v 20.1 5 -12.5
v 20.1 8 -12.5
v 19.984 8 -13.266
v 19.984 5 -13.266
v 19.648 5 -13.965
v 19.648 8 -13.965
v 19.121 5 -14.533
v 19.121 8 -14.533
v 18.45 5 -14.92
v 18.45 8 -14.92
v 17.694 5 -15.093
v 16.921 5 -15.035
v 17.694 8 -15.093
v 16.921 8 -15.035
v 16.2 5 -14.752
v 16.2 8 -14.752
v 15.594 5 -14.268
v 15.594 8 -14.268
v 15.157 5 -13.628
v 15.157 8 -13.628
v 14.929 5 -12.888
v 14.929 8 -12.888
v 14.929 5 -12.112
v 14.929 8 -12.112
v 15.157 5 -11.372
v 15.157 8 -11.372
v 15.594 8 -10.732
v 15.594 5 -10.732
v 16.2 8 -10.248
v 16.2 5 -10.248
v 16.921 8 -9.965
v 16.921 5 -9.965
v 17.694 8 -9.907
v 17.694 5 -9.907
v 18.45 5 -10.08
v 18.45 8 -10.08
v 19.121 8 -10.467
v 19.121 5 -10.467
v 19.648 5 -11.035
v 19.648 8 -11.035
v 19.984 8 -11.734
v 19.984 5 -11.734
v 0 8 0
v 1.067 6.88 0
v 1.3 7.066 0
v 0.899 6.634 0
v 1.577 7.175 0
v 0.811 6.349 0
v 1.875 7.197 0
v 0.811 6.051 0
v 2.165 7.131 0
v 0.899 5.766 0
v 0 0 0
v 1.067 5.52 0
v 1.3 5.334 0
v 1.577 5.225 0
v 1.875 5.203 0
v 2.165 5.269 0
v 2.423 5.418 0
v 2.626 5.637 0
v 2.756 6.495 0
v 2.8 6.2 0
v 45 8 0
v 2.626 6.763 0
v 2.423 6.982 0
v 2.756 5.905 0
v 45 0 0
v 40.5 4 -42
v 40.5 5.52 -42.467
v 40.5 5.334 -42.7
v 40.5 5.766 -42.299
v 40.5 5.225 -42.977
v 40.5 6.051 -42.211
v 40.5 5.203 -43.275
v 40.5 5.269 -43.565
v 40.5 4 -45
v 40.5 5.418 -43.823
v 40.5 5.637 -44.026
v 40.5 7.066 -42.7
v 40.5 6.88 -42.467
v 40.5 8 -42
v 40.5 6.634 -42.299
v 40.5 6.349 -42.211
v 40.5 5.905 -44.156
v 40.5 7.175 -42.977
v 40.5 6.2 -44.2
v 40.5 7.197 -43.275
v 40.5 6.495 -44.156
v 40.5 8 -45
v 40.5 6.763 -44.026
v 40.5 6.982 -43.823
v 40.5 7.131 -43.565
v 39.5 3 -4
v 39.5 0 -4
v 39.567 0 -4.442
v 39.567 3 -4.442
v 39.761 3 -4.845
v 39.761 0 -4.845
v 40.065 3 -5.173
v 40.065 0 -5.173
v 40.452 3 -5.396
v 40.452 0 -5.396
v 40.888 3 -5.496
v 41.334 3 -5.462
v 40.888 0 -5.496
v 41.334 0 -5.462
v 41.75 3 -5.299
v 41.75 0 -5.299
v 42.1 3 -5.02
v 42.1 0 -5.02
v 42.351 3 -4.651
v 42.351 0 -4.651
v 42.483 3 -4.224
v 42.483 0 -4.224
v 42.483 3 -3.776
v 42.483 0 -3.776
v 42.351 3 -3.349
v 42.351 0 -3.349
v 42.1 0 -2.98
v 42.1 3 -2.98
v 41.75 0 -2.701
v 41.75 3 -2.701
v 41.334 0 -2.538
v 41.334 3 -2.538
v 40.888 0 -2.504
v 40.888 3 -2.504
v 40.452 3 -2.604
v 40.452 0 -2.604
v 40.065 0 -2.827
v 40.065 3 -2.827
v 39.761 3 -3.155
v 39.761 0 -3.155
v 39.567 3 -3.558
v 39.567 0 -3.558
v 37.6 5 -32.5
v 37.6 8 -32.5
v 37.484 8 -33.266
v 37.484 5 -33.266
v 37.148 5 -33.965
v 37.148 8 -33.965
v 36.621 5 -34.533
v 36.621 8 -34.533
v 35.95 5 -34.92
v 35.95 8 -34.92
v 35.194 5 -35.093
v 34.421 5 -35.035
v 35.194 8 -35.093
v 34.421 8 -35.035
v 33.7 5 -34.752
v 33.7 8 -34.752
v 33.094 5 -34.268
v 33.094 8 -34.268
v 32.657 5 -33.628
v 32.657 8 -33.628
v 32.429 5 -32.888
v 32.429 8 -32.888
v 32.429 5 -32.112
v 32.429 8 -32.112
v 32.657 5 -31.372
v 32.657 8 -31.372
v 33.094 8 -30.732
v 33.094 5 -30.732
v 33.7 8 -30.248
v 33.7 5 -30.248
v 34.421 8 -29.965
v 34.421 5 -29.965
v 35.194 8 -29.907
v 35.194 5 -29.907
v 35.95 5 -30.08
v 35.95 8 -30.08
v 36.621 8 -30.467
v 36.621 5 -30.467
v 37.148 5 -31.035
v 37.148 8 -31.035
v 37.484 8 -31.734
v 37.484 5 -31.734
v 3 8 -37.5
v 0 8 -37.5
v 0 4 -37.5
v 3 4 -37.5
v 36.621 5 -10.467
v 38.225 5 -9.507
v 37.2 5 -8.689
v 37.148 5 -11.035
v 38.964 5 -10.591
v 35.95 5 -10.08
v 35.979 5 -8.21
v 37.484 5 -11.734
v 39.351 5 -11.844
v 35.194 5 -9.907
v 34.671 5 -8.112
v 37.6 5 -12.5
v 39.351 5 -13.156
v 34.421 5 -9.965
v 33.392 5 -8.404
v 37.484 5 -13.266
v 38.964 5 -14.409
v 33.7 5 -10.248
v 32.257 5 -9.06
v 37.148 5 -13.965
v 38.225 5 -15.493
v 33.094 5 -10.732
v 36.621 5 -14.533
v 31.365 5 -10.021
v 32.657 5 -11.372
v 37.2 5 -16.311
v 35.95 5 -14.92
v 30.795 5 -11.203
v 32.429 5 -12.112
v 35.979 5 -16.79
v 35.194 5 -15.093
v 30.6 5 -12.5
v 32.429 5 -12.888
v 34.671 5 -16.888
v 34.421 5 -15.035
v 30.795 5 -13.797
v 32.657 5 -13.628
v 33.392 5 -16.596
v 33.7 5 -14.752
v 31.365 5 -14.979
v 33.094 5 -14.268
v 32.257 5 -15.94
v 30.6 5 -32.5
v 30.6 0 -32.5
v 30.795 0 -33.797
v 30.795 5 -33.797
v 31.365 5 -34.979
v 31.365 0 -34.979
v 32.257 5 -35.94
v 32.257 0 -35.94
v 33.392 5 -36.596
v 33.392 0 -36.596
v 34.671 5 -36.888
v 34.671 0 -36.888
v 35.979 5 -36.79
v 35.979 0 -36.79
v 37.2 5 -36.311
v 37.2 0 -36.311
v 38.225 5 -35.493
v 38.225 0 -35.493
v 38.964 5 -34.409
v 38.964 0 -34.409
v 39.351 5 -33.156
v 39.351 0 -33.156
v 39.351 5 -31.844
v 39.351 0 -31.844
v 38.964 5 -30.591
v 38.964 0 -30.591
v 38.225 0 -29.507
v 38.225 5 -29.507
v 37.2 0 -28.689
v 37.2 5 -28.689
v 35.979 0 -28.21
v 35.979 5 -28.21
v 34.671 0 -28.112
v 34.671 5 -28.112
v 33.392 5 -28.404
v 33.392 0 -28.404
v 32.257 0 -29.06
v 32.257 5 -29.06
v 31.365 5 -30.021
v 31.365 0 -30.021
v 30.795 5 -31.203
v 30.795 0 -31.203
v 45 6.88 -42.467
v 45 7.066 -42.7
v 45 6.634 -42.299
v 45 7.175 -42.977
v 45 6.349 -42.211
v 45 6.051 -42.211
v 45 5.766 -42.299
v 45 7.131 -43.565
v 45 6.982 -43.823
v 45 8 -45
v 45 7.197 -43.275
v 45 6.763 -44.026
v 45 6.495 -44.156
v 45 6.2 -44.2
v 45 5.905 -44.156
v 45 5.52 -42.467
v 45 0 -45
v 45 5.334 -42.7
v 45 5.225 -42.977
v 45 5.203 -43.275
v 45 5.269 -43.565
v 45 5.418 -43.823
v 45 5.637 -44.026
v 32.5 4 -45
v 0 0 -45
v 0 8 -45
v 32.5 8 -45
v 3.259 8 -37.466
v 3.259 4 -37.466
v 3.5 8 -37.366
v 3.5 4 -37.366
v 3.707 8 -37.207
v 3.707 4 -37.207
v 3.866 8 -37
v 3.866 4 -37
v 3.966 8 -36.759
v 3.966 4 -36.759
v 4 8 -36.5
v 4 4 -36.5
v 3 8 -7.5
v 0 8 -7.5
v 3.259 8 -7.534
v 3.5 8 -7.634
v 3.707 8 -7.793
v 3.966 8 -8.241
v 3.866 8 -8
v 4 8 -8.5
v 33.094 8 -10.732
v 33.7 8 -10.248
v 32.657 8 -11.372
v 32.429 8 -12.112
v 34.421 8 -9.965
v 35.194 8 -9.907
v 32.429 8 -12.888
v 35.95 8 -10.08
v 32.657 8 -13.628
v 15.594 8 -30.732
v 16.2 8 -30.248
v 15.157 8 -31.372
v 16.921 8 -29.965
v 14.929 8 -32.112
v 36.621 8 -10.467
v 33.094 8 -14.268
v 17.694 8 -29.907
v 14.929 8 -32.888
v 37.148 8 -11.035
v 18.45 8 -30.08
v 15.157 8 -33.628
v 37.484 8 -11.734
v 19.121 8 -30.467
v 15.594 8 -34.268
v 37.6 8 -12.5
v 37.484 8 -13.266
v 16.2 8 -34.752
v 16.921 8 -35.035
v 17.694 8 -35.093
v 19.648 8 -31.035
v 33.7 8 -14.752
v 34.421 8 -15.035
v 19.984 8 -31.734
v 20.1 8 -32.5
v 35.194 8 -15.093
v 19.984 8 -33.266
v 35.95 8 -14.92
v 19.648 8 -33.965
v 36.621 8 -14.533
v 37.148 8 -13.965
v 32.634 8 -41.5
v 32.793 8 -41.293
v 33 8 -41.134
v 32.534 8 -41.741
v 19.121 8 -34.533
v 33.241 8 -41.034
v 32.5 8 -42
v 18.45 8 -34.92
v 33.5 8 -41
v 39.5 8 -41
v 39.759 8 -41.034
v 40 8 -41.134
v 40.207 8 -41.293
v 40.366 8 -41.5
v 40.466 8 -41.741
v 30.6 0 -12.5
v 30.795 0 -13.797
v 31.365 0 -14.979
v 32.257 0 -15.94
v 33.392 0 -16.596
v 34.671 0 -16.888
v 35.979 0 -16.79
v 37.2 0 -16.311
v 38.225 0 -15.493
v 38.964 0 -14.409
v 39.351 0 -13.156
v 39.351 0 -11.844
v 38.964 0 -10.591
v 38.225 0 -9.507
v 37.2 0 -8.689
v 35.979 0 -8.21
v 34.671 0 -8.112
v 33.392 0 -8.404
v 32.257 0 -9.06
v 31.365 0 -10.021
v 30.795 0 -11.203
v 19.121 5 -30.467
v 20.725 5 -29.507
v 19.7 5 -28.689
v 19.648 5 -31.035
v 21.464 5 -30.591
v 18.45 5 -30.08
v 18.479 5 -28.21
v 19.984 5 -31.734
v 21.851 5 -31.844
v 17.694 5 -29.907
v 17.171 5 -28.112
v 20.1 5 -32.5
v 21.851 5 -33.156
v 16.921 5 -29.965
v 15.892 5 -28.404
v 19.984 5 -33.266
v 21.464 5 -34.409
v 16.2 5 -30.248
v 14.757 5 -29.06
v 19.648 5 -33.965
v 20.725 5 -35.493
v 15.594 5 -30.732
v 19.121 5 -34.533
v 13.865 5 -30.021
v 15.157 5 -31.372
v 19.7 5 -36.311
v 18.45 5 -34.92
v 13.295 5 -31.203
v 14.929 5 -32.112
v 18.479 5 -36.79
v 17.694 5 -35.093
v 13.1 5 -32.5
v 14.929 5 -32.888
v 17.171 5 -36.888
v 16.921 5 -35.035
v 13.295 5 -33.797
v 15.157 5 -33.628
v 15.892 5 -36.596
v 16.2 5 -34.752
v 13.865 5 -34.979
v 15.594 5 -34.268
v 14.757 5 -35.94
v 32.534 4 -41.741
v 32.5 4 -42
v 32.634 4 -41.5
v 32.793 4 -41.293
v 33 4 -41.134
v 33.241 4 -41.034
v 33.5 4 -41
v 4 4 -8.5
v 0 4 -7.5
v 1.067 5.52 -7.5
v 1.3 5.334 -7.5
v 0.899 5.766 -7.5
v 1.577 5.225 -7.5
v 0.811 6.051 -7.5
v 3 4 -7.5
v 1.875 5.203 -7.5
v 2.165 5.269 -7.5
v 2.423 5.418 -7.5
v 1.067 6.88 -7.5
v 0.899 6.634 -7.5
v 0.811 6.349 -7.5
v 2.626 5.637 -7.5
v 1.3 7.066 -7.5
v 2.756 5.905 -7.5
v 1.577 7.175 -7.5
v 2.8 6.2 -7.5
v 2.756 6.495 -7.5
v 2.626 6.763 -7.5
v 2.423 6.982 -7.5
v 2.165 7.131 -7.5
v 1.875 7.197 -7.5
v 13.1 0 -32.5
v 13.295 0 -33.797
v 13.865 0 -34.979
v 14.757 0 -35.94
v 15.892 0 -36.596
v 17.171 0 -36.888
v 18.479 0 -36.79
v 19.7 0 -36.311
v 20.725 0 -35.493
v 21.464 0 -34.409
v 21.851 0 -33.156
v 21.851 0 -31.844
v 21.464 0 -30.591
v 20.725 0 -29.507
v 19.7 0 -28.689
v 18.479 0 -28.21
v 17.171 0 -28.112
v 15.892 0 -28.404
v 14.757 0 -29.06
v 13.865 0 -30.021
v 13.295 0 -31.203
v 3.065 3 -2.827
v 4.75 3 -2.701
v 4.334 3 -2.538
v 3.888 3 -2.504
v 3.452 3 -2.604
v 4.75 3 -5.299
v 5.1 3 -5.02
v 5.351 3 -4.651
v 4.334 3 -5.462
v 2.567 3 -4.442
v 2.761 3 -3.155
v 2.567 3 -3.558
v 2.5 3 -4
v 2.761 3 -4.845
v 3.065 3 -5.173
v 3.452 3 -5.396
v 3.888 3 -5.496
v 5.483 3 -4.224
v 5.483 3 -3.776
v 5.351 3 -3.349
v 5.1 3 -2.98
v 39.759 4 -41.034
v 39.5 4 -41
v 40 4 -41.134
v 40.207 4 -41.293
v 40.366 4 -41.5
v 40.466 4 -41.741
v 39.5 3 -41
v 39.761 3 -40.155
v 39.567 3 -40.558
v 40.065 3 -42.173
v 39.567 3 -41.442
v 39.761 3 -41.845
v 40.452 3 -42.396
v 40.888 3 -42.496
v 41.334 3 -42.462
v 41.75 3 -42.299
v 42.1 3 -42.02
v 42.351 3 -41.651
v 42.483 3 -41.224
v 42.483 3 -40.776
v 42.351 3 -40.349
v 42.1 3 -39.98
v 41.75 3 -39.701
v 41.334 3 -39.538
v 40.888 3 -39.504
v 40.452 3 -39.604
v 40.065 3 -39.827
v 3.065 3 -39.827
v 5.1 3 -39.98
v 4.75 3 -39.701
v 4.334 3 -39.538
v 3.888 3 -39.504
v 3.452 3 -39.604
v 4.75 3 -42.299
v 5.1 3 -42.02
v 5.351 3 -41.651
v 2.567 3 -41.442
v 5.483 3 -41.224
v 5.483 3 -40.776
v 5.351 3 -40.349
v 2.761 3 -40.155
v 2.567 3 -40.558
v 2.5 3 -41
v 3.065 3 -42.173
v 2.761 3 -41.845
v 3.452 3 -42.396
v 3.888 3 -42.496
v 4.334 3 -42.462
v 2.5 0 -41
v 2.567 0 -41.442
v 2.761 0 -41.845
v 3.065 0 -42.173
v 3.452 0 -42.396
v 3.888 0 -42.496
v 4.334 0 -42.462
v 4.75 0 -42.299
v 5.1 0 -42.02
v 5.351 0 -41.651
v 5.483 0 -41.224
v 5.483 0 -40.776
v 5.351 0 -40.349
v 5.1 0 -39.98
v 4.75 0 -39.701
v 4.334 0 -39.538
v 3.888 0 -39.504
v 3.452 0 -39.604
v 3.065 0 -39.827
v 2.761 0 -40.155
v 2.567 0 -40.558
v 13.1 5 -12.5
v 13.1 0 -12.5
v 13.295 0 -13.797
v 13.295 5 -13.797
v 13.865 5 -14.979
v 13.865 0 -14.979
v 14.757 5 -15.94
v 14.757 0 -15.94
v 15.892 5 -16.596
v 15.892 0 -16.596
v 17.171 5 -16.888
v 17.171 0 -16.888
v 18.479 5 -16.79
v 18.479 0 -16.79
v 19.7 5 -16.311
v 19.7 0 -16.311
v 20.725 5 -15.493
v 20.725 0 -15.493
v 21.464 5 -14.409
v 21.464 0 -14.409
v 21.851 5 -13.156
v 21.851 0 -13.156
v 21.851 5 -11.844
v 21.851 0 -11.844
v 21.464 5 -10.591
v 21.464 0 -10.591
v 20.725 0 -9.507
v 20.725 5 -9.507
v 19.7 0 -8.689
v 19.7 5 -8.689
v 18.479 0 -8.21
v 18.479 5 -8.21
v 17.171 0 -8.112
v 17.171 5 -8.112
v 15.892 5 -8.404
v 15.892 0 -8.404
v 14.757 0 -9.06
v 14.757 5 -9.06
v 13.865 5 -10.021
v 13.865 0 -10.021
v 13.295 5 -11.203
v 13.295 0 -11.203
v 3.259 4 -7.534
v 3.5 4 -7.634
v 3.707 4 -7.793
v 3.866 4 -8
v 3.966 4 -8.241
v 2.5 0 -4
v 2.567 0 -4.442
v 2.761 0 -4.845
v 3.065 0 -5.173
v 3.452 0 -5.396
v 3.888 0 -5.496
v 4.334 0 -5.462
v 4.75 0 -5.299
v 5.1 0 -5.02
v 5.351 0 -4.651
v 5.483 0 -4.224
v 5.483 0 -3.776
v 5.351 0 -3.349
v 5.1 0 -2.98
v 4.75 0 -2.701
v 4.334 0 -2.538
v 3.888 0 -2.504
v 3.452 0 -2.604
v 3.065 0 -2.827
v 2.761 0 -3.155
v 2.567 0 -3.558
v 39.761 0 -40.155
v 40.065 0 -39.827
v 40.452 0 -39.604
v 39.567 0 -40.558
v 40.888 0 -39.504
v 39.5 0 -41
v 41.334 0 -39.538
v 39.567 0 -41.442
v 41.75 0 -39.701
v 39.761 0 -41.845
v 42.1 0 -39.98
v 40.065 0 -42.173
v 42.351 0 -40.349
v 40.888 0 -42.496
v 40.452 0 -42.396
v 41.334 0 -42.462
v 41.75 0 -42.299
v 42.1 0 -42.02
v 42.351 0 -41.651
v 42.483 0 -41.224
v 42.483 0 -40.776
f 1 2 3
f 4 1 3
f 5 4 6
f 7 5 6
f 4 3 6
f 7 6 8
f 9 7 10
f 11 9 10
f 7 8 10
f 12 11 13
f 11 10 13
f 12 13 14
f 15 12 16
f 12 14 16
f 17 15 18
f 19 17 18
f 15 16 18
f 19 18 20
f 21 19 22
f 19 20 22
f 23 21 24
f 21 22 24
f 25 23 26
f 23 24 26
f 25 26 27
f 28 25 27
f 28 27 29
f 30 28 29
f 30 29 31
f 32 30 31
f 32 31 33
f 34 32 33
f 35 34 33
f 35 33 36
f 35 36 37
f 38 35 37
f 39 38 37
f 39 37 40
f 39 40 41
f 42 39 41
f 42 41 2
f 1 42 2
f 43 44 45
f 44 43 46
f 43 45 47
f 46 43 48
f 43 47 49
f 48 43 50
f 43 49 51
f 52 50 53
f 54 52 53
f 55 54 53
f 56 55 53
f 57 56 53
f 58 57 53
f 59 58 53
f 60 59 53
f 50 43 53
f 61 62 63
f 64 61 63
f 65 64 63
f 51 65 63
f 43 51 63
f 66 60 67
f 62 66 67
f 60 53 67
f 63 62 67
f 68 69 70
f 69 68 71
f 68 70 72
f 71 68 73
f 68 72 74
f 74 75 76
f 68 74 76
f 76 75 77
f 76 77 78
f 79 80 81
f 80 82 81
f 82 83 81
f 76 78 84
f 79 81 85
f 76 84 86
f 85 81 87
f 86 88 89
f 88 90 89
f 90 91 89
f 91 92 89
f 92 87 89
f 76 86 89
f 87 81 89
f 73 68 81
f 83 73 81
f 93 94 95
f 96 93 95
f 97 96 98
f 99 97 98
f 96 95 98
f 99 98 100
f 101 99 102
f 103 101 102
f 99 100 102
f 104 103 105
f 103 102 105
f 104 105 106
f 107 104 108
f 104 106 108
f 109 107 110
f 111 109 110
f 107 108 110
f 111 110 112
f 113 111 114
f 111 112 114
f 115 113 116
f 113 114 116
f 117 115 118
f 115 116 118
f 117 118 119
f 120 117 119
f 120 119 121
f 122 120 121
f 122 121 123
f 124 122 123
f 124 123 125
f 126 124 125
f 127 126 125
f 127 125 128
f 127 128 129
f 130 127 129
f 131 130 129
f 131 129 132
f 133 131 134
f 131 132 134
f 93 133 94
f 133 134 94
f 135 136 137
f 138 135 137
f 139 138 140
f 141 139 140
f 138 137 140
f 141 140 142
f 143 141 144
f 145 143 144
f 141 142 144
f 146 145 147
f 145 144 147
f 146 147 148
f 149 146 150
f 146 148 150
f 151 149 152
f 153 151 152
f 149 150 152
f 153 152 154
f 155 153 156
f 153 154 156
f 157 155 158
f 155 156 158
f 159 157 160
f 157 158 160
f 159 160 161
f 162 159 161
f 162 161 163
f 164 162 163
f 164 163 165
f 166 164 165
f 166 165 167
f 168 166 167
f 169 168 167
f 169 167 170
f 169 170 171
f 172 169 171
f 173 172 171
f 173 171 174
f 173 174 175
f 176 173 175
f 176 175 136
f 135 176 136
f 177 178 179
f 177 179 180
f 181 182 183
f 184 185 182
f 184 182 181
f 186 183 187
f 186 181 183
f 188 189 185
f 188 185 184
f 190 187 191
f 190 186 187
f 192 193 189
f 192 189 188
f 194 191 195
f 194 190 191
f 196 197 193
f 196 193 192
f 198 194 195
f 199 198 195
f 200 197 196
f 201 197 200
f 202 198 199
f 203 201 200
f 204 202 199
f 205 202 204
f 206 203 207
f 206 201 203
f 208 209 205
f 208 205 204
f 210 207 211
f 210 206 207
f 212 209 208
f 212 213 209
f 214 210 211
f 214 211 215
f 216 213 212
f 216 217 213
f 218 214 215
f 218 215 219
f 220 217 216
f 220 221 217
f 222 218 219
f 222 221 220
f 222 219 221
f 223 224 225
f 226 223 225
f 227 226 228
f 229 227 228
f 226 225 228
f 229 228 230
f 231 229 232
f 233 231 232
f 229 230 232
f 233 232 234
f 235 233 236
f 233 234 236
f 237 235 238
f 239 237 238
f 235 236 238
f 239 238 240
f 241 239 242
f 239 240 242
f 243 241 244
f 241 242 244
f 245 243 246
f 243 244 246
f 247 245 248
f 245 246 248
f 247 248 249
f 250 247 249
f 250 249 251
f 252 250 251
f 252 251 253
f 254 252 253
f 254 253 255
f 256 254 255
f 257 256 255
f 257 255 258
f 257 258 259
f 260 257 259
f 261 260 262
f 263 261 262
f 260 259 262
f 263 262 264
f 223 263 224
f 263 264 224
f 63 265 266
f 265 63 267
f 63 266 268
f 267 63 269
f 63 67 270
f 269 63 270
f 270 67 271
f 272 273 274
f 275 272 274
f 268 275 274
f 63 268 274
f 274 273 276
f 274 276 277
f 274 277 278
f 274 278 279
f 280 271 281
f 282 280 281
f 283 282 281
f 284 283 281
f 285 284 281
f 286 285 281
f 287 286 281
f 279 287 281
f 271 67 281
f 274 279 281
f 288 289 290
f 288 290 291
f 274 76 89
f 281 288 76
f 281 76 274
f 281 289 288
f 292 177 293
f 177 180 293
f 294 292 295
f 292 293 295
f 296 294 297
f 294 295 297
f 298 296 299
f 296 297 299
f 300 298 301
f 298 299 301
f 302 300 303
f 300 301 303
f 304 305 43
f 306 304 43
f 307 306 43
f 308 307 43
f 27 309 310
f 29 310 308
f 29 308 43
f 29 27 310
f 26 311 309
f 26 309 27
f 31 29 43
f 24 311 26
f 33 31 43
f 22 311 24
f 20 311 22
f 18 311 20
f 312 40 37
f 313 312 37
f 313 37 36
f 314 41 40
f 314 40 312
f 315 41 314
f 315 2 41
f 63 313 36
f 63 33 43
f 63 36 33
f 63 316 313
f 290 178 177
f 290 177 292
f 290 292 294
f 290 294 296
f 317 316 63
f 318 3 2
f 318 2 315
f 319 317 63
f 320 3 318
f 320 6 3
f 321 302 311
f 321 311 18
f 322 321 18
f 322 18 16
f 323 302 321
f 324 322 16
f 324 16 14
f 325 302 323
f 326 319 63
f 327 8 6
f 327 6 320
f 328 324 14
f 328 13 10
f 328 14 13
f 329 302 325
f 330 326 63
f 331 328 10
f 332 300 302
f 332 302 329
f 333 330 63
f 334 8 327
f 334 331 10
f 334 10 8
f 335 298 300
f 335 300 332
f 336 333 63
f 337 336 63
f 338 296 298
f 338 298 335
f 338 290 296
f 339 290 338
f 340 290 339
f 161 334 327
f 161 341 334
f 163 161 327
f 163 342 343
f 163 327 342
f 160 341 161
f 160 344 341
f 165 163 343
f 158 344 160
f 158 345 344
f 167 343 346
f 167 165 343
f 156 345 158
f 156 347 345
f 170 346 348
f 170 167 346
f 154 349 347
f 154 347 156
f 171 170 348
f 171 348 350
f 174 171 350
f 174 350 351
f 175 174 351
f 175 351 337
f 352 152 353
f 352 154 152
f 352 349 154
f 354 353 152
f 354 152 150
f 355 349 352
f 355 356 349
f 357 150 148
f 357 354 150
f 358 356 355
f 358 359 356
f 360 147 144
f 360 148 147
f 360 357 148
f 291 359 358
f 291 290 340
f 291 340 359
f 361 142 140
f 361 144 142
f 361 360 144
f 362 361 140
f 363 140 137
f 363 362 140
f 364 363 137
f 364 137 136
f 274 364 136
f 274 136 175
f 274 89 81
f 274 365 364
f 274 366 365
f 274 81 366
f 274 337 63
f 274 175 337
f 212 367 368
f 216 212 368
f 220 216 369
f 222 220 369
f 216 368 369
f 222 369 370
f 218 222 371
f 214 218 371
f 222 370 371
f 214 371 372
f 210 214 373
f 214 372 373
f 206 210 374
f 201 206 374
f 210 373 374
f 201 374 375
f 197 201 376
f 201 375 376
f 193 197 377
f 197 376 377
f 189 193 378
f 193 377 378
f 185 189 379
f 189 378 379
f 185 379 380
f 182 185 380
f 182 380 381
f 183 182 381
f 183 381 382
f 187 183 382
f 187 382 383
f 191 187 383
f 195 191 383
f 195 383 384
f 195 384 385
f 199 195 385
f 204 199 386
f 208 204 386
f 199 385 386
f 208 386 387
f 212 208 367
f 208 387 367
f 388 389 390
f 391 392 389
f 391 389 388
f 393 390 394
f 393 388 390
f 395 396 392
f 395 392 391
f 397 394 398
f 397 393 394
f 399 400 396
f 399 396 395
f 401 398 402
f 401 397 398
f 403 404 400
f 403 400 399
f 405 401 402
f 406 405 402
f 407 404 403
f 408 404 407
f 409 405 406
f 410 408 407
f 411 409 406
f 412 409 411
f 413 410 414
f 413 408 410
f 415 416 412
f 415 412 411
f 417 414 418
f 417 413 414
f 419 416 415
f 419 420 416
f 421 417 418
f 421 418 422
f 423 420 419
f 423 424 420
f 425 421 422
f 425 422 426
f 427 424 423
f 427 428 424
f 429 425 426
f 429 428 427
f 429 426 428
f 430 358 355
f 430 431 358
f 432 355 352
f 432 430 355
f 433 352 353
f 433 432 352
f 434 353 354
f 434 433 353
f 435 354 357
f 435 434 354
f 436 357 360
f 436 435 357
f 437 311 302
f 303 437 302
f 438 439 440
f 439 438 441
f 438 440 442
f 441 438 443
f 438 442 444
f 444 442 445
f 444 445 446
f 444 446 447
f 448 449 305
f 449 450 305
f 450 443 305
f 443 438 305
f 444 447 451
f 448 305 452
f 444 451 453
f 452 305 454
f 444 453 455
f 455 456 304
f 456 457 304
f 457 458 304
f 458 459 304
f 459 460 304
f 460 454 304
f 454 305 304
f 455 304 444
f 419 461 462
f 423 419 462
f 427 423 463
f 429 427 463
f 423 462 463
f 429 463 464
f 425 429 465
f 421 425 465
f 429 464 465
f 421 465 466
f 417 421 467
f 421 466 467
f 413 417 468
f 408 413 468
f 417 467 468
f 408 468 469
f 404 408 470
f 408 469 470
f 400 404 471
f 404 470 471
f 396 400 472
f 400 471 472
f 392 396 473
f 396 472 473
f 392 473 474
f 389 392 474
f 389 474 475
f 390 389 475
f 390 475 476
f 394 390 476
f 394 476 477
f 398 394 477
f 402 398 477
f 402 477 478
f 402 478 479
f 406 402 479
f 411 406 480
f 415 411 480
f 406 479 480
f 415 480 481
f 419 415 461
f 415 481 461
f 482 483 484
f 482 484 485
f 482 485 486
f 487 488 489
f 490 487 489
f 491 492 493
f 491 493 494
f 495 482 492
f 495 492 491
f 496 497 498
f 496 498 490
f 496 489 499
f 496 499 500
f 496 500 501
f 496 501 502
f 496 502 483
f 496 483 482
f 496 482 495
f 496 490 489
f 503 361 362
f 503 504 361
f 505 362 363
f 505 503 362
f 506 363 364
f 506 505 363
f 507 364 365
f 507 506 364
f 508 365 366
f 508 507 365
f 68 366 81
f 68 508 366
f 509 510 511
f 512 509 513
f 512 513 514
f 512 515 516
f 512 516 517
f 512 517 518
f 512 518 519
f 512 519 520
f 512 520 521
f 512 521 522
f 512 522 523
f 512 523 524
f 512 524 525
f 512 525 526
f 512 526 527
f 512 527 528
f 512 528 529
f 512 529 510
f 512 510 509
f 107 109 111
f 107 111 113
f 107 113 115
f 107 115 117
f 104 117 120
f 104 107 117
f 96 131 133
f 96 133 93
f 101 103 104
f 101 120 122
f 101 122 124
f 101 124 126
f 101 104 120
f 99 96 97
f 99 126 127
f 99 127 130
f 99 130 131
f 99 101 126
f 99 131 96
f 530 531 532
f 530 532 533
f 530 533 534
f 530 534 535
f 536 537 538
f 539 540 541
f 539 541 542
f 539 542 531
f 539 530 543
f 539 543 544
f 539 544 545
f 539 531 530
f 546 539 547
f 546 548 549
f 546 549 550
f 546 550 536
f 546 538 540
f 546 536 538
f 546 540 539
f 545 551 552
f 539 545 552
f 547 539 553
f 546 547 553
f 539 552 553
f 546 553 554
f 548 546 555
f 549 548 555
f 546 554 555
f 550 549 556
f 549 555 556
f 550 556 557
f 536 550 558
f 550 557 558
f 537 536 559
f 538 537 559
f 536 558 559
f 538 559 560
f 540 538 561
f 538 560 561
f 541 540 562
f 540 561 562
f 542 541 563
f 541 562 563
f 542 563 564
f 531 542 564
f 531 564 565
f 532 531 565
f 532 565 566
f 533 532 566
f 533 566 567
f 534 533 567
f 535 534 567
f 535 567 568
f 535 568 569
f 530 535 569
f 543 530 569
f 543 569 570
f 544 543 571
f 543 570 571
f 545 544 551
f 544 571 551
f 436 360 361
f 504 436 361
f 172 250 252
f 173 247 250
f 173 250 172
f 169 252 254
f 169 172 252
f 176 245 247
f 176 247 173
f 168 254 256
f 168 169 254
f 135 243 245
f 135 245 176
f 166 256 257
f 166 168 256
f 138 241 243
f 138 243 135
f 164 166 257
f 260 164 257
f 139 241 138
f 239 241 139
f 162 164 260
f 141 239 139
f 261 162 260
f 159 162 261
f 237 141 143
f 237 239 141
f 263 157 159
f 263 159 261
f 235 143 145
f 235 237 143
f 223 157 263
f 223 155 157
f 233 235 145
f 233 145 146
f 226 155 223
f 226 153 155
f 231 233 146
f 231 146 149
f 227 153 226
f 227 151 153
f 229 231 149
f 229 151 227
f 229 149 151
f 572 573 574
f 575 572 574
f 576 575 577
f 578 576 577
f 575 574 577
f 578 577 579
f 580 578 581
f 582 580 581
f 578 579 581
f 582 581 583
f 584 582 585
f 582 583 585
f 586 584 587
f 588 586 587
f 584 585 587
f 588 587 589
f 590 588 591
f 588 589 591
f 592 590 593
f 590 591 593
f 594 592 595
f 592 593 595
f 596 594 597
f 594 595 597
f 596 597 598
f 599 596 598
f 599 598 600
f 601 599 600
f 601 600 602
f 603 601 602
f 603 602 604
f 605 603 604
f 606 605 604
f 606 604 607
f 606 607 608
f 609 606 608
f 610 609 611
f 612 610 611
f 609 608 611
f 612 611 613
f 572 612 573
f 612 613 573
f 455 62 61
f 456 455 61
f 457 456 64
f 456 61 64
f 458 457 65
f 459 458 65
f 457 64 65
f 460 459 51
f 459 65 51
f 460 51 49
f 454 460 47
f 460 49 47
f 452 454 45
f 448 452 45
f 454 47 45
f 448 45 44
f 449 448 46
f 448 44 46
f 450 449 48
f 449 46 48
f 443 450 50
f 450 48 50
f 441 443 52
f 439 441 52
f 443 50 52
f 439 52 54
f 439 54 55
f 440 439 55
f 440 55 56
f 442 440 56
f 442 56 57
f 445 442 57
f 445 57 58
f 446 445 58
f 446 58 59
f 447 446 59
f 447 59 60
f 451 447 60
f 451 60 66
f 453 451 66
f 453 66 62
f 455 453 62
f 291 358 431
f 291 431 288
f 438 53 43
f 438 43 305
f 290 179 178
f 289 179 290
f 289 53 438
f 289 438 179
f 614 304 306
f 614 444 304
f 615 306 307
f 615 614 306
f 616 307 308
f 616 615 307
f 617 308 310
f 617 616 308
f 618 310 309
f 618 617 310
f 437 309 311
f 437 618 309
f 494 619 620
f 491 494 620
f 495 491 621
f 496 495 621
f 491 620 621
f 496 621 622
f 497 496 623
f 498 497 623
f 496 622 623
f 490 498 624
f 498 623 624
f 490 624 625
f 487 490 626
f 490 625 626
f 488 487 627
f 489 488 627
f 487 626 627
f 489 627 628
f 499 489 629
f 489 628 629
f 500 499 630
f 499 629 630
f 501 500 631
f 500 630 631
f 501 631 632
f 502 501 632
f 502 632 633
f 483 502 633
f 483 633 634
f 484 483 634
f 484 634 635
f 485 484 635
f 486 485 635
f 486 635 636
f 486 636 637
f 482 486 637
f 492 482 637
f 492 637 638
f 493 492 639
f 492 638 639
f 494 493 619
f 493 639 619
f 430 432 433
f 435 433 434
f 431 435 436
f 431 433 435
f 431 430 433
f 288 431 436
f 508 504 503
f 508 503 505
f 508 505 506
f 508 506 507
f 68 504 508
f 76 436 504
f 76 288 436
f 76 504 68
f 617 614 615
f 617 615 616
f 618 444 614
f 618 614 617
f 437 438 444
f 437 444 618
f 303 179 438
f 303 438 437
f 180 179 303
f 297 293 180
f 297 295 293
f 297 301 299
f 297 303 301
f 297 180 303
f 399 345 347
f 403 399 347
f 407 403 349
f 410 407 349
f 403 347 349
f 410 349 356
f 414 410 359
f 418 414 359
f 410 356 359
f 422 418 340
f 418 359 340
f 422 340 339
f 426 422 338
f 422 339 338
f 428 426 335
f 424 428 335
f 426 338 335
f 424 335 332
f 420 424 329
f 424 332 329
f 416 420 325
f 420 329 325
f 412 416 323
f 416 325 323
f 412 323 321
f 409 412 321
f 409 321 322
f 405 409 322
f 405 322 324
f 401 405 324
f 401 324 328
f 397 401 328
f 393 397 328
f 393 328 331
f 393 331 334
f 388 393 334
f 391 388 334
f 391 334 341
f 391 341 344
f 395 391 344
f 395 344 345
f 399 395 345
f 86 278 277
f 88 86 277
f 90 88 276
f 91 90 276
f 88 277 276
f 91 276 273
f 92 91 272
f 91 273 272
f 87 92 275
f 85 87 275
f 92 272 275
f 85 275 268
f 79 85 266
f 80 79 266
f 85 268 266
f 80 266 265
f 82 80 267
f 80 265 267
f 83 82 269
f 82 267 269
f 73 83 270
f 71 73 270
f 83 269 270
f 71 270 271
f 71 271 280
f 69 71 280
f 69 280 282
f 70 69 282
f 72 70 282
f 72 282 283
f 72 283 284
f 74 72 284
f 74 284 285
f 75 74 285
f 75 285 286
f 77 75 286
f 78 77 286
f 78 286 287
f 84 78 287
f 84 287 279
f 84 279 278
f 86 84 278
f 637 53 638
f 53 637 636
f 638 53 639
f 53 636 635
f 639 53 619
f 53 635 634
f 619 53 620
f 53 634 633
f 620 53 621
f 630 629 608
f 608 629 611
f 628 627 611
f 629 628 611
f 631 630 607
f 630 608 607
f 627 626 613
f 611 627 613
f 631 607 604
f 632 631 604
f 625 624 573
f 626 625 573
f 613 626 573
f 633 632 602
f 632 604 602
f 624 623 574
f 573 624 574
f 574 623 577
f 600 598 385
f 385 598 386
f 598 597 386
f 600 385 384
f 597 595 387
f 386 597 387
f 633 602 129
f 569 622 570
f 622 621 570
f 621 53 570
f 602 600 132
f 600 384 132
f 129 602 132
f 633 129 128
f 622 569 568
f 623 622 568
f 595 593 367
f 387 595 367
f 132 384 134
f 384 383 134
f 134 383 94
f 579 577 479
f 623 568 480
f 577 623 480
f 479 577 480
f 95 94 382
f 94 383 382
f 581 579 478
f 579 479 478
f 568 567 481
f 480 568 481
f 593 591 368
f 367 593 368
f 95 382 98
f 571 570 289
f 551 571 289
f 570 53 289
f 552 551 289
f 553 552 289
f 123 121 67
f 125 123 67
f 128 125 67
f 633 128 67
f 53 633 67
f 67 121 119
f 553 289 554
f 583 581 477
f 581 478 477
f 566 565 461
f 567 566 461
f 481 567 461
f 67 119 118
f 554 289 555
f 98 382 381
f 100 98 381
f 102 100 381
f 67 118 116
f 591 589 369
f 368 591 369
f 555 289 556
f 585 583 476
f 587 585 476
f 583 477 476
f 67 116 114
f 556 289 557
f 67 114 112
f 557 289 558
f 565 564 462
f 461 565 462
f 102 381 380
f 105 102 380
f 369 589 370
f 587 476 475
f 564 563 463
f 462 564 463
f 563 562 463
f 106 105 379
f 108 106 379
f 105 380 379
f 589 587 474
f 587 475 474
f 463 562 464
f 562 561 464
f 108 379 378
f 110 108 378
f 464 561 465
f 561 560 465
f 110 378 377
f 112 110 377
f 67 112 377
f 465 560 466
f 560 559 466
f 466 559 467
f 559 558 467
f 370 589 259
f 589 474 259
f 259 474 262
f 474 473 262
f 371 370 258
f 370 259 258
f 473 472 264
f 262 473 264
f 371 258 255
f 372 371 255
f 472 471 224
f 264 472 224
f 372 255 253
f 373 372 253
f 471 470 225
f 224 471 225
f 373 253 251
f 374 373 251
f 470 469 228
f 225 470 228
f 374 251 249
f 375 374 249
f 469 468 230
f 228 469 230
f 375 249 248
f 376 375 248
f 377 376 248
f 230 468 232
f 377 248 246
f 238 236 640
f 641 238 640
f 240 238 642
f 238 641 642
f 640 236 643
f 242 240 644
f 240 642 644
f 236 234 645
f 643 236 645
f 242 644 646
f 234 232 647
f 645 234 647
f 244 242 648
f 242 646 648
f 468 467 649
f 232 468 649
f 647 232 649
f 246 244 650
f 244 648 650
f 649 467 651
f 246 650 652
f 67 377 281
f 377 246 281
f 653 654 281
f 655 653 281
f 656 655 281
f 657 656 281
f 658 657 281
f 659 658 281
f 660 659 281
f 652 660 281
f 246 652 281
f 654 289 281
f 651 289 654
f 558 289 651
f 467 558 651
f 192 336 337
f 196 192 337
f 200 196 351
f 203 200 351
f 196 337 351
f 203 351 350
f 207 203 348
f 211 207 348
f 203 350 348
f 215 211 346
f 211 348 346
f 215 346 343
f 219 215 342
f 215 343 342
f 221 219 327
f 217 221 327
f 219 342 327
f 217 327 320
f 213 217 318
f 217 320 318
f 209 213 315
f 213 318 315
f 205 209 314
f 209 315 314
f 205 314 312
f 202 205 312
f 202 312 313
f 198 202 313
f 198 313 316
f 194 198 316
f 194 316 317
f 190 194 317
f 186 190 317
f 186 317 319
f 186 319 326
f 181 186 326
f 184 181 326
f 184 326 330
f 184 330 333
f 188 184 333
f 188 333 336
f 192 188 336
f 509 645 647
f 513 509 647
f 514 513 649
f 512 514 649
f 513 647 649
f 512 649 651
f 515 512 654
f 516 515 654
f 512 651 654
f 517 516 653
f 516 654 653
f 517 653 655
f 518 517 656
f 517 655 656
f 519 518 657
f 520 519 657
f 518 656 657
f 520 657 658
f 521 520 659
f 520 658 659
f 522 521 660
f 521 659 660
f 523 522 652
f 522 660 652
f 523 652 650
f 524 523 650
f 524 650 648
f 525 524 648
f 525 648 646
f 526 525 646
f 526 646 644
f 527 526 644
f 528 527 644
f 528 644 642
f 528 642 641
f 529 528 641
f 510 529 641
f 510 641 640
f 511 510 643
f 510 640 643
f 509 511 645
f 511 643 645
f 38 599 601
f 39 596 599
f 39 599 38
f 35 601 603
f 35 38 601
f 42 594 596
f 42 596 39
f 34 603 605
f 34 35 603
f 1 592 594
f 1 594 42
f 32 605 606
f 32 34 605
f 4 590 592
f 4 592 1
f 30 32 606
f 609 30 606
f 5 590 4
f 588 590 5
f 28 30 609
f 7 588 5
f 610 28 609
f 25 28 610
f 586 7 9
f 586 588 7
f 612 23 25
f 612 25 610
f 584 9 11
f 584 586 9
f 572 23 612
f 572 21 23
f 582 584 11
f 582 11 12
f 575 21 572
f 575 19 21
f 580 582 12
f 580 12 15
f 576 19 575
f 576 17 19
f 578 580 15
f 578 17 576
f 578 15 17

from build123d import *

# Parameters (mm, degrees)
SKETCH_1_W           = 45
SKETCH_1_H           = 45
EXTRUDE_1_DEPTH      = 8
SKETCH_2_R           = 2.6
CUT_EXTRUDE_1_DEPTH  = 9
SKETCH_3_R           = 4.4
CUT_EXTRUDE_2_DEPTH  = 5
SKETCH_5_W           = 4
SKETCH_5_H           = 30
CUT_EXTRUDE_4_DEPTH  = 4
SKETCH_6_R           = 1
CUT_EXTRUDE_5_DEPTH  = 9
FILLET_1_R           = 1
SKETCH_7_W           = 8
SKETCH_7_H           = 4
CUT_EXTRUDE_6_DEPTH  = 4
FILLET_2_R           = 1
SKETCH_8_R           = 1
CUT_EXTRUDE_7_DEPTH  = 9
SKETCH_11_R          = 1.5
CUT_EXTRUDE_10_DEPTH = 3


with BuildPart() as part:
    # 草图1 → 凸台-拉伸1 (new body)
    with BuildSketch(Plane(origin=(0, 0, 0), x_dir=(1, 0, 0), z_dir=(0, 1, 0))):
        with Locations((22.5, 22.5)):
            Rectangle(SKETCH_1_W, SKETCH_1_H)
    extrude(amount=EXTRUDE_1_DEPTH)

    # 草图2 → 切除-拉伸1 (cut, through all)
    with BuildSketch(Plane(origin=(0, 8, 0), x_dir=(1, 0, 0), z_dir=(0, 1, 0))):
        with Locations((17.5, 12.5)):
            Circle(SKETCH_2_R)
        with Locations((17.5, 32.5)):
            Circle(SKETCH_2_R)
        with Locations((35, 12.5)):
            Circle(SKETCH_2_R)
        with Locations((35, 32.5)):
            Circle(SKETCH_2_R)
    extrude(amount=-CUT_EXTRUDE_1_DEPTH, mode=Mode.SUBTRACT)

    # 草图3 → 切除-拉伸2 (cut)
    with BuildSketch(Plane(origin=(0, 0, 0), x_dir=(-1, 0, 0), z_dir=(0, -1, 0))):
        with Locations((-17.5, 32.5)):
            Circle(SKETCH_3_R)
        with Locations((-17.5, 12.5)):
            Circle(SKETCH_3_R)
        with Locations((-35, 12.5)):
            Circle(SKETCH_3_R)
        with Locations((-35, 32.5)):
            Circle(SKETCH_3_R)
    extrude(amount=-CUT_EXTRUDE_2_DEPTH, mode=Mode.SUBTRACT)

    # 草图5 → 切除-拉伸4 (cut)
    with BuildSketch(Plane(origin=(0, 8, 0), x_dir=(1, 0, 0), z_dir=(0, 1, 0))):
        with Locations((2, 22.5)):
            Rectangle(SKETCH_5_W, SKETCH_5_H)
    extrude(amount=-CUT_EXTRUDE_4_DEPTH, mode=Mode.SUBTRACT)

    # 草图6 → 切除-拉伸5 (cut)
    with BuildSketch(Plane.XY):
        with Locations((1.8, 6.2)):
            Circle(SKETCH_6_R)
    extrude(amount=-CUT_EXTRUDE_5_DEPTH, mode=Mode.SUBTRACT)

    # 圆角1
    fillet_1_edges = [part.edges().sort_by_distance(p)[0] for p in [
        (4, 6, -37.5),
        (4, 6, -7.5),
    ]]
    fillet(fillet_1_edges, radius=FILLET_1_R)

    # 草图7 → 切除-拉伸6 (cut)
    with BuildSketch(Plane(origin=(0, 8, 0), x_dir=(1, 0, 0), z_dir=(0, 1, 0))):
        with Locations((36.5, 43)):
            Rectangle(SKETCH_7_W, SKETCH_7_H)
    extrude(amount=-CUT_EXTRUDE_6_DEPTH, mode=Mode.SUBTRACT)

    # 圆角2
    fillet_2_edges = [part.edges().sort_by_distance(p)[0] for p in [
        (40.5, 6, -41),
        (32.5, 6, -41),
    ]]
    fillet(fillet_2_edges, radius=FILLET_2_R)

    # 草图8 → 切除-拉伸7 (cut)
    with BuildSketch(Plane(origin=(45, 0, 0), x_dir=(0, 0, -1), z_dir=(1, 0, 0))):
        with Locations((43.2, 6.2)):
            Circle(SKETCH_8_R)
    extrude(amount=-CUT_EXTRUDE_7_DEPTH, mode=Mode.SUBTRACT)

    # 草图11 → 切除-拉伸10 (cut)
    with BuildSketch(Plane(origin=(0, 0, 0), x_dir=(-1, 0, 0), z_dir=(0, -1, 0))):
        with Locations((-4, 4)):
            Circle(SKETCH_11_R)
        with Locations((-41, 4)):
            Circle(SKETCH_11_R)
        with Locations((-4, 41)):
            Circle(SKETCH_11_R)
        with Locations((-41, 41)):
            Circle(SKETCH_11_R)
    extrude(amount=-CUT_EXTRUDE_10_DEPTH, mode=Mode.SUBTRACT)


solid = part.part
